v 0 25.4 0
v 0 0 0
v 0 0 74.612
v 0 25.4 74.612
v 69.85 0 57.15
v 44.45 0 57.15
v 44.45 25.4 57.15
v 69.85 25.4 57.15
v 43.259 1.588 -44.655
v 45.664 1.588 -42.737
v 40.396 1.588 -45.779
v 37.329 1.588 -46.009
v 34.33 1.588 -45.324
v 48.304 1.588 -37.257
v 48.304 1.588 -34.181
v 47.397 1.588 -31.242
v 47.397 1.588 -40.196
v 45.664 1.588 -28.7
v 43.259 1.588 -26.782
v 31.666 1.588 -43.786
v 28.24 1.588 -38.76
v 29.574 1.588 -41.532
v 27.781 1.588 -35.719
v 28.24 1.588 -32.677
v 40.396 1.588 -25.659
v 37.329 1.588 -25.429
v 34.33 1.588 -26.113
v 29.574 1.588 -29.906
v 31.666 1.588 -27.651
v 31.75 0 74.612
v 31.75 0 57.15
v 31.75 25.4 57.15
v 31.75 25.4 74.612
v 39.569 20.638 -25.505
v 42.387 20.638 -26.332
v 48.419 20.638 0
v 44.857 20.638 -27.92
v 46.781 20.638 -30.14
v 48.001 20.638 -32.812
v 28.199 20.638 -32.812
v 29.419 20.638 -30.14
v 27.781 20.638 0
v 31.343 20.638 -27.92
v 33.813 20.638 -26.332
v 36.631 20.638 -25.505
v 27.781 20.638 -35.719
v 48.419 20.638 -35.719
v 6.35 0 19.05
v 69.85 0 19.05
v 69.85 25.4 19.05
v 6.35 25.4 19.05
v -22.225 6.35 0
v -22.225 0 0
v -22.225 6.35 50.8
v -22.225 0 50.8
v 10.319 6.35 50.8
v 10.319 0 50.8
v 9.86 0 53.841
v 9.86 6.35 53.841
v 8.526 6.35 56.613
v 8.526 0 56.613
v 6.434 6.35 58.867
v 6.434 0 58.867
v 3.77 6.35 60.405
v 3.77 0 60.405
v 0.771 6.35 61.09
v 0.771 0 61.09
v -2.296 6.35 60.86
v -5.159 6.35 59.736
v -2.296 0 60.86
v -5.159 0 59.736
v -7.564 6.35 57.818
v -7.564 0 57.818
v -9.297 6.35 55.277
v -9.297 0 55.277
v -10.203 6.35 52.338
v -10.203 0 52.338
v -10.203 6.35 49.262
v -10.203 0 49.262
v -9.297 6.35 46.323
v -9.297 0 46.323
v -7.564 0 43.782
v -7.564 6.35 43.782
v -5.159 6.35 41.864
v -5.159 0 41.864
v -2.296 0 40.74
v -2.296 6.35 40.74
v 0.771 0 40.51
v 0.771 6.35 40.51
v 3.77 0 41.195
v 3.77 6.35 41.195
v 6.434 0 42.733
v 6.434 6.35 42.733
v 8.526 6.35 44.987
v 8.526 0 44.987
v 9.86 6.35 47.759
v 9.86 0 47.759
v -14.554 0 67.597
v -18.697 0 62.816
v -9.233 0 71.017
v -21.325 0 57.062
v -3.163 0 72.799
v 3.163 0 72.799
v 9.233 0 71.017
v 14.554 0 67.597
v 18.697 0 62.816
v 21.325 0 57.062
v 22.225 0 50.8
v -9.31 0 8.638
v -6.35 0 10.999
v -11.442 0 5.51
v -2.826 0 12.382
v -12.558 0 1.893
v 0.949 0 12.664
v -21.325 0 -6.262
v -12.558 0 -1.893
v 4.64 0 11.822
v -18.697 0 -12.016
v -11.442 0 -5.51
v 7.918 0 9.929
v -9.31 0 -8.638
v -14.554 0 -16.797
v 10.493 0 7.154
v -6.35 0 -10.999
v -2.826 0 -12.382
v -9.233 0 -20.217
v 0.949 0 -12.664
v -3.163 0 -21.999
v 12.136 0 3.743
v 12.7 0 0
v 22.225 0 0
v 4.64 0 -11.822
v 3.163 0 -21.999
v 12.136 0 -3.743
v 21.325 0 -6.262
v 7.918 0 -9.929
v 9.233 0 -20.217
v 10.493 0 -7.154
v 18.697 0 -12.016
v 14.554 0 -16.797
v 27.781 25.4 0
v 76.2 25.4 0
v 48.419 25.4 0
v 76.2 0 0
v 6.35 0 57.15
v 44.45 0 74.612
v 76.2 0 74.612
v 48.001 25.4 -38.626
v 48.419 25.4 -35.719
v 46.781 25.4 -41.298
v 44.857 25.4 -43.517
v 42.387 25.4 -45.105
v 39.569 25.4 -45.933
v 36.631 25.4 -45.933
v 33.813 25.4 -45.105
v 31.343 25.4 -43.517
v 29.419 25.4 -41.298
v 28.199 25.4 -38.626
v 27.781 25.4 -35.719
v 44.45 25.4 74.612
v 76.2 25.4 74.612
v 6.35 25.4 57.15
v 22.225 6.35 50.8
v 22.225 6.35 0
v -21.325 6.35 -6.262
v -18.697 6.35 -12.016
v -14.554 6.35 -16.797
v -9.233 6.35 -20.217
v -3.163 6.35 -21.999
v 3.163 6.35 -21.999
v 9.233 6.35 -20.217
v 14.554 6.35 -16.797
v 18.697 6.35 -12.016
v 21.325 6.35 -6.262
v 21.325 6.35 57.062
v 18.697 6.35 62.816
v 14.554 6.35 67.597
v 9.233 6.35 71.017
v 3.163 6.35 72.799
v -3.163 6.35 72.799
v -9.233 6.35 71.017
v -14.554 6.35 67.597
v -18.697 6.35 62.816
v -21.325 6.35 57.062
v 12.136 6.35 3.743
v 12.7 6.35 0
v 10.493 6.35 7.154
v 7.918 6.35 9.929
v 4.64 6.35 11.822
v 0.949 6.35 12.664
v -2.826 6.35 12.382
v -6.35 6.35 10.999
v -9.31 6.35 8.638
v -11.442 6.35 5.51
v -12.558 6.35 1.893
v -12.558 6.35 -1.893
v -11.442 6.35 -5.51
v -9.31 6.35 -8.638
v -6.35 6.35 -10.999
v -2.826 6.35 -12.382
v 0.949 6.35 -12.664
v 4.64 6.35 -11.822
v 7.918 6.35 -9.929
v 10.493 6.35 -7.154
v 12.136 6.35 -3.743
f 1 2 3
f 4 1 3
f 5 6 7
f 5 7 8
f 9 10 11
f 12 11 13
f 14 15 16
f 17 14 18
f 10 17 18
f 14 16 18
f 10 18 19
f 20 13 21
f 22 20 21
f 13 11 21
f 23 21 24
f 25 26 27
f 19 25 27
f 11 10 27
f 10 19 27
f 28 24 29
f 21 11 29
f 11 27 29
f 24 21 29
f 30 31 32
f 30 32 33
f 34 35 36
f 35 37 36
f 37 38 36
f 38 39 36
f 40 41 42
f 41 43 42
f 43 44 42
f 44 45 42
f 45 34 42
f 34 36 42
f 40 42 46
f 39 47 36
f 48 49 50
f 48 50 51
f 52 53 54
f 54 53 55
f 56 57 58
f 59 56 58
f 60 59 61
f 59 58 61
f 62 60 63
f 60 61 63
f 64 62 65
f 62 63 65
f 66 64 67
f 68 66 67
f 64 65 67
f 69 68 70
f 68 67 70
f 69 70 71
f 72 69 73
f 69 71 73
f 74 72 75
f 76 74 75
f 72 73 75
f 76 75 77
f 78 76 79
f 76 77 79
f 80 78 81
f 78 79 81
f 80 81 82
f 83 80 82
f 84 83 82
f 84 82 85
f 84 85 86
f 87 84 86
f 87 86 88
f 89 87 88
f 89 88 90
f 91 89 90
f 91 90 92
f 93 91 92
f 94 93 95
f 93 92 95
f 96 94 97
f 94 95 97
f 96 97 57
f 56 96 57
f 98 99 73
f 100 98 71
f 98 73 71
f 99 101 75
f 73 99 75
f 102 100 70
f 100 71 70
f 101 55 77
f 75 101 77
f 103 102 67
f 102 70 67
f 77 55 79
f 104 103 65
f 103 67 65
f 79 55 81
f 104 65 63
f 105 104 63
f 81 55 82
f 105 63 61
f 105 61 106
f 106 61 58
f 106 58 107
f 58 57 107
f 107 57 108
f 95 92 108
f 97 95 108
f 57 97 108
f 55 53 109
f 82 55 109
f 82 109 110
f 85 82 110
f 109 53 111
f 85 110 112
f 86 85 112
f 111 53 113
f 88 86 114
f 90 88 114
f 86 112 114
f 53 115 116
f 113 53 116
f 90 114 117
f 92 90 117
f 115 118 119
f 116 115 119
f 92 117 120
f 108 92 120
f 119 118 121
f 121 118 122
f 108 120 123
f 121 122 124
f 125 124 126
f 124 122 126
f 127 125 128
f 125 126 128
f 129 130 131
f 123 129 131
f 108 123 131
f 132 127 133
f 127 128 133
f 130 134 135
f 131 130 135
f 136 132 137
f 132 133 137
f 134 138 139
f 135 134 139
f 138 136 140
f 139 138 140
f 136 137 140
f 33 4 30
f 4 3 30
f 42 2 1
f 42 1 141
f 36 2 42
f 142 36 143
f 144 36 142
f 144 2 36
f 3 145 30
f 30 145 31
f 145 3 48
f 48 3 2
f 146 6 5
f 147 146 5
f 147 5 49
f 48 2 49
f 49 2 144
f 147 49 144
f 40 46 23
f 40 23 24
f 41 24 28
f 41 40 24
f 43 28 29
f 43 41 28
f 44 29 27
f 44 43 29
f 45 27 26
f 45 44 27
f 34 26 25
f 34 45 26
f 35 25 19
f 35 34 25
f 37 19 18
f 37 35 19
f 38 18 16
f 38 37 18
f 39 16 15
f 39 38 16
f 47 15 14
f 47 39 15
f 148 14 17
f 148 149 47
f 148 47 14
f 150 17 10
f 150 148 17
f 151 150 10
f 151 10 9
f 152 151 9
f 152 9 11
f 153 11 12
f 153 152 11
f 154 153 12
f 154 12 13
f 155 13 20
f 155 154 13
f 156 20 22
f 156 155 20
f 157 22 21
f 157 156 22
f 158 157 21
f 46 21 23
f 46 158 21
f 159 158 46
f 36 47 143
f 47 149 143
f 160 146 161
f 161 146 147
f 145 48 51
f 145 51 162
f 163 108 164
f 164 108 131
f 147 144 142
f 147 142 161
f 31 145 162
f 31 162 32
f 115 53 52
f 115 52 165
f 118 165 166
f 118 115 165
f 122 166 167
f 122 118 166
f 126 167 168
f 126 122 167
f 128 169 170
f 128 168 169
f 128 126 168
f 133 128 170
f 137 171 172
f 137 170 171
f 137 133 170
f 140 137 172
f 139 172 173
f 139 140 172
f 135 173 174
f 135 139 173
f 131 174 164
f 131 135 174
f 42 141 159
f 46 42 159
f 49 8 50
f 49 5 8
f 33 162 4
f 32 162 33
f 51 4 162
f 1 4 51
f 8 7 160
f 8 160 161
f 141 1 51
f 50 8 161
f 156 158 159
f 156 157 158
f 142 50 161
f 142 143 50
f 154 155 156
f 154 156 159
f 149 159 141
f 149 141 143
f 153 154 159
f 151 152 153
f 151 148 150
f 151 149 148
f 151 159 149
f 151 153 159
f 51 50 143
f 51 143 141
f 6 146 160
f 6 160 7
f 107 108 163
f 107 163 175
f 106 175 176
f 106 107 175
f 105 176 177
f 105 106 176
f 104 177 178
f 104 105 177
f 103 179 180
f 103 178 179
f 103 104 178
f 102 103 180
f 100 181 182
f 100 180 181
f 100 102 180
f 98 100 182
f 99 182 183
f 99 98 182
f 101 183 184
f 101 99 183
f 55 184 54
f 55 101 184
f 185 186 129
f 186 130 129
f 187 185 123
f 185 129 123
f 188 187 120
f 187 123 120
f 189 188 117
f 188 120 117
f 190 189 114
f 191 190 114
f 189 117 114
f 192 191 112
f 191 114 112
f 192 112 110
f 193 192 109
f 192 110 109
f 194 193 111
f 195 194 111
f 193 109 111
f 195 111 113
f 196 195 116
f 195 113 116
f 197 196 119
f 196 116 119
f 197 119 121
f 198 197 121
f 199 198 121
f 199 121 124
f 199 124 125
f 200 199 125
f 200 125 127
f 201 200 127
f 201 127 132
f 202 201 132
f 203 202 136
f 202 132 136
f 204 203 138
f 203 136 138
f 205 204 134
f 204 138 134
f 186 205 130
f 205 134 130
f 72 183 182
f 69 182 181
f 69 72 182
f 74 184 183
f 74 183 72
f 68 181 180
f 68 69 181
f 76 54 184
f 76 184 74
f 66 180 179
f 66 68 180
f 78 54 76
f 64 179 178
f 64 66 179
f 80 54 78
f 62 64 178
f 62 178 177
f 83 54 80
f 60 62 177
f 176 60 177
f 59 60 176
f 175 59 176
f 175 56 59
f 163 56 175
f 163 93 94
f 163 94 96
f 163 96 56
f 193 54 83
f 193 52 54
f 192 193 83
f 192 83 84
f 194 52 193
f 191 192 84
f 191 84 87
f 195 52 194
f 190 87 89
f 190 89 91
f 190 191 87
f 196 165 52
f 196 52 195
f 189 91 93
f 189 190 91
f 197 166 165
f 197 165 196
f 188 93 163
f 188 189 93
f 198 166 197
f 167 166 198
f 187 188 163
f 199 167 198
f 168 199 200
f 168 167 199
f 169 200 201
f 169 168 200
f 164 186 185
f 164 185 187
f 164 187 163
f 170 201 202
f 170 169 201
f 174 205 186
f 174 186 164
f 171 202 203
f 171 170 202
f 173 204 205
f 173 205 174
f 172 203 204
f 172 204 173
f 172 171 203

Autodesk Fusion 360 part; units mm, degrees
sketch "Sketch1" plane through (0, 0, 0) normal (0, 1, 0) x (1, 0, 0)
  line L0 (0, 0) -> (76.2, 0)
  line L1 (76.2, 0) -> (76.2, -74.6125)
  line L2 (0, 0) -> (0, -74.6125)
  line L3 (0, -74.6125) -> (76.2, -74.6125)
  dimension "d17" = 76.2
  dimension "d18" = 74.6125
  dimension "d19" = 74.6125
  dimension "d20" = 76.2
extrude "Extrude1" add sketch "Sketch1" along normal blind 25.4 makes body 1
sketch "Sketch2" plane through (0, 0, 0) normal (0, -1, 0) x (1, 0, 0)
  line L0 (0, 74.6125) -> (0, 0)
  line L1 (0, 0) -> (76.2, 0)
  line L2 (76.2, 0) -> (76.2, 74.6125)
  line L3 (76.2, 74.6125) -> (0, 74.6125)
  line L4 (6.35, 57.15) -> (69.85, 57.15)
  line L5 (69.85, 57.15) -> (69.85, 19.05)
  line L6 (69.85, 19.05) -> (6.35, 19.05)
  line L7 (6.35, 19.05) -> (6.35, 57.15)
  dimension "d23" = 19.05
  dimension "d24" = 63.5
  dimension "d25" = 6.35
  dimension "d26" = 38.1
extrude "Extrude2" cut sketch "Sketch2" against normal through all contours L4 L5 L6 L7 bodies 1
sketch "Sketch3" plane through (0, 0, 0) normal (0, -1, 0) x (1, 0, 0)
  line L0 (6.35, 19.05) -> (6.35, 57.15)
  line L1 (6.35, 57.15) -> (69.85, 57.15)
  line L2 (69.85, 57.15) -> (69.85, 19.05)
  line L3 (69.85, 19.05) -> (6.35, 19.05)
  line L4 (0, 74.6125) -> (0, 0)
  line L5 (0, 0) -> (76.2, 0)
  line L6 (76.2, 0) -> (76.2, 74.6125)
  line L7 (76.2, 74.6125) -> (0, 74.6125)
  line L8 (31.75, 74.6125) -> (44.45, 74.6125)
  line L9 (44.45, 74.6125) -> (44.45, 57.15)
  line L10 (44.45, 57.15) -> (31.75, 57.15)
  line L11 (31.75, 57.15) -> (31.75, 74.6125)
  dimension "d28" = 12.7
  dimension "d29" = 31.75
extrude "Extrude3" cut sketch "Sketch3" against normal through all contours L1 L7 L8 L9 L10 L11 bodies 1
sketch "Sketch4" plane through (0, 25.4, 0) normal (0, 1, 0) x (-1, 0, 0)
  line L0 (-31.75, 74.6125) -> (-31.75, 57.15)
  line L1 (-31.75, 57.15) -> (-6.35, 57.15)
  line L2 (-6.35, 57.15) -> (-6.35, 19.05)
  line L3 (-6.35, 19.05) -> (-69.85, 19.05)
  line L4 (-69.85, 19.05) -> (-69.85, 57.15)
  line L5 (-69.85, 57.15) -> (-44.45, 57.15)
  line L6 (-44.45, 57.15) -> (-44.45, 74.6125)
  line L7 (-44.45, 74.6125) -> (-76.2, 74.6125)
  line L8 (-76.2, 74.6125) -> (-76.2, 0)
  line L9 (-76.2, 0) -> (0, 0)
  line L10 (0, 0) -> (0, 74.6125)
  line L11 (0, 74.6125) -> (-31.75, 74.6125)
  line L12 (-48.4188, 0) -> (-27.7812, 0)
  line L13 (-27.7812, 0) -> (-27.7812, -35.7188)
  line L14 (-27.7812, -35.7188) -> (-48.4188, -35.7188)
  line L15 (-48.4188, -35.7188) -> (-48.4188, 0)
  dimension "d36" = 20.6375
  dimension "d37" = 27.7812
  dimension "d40" = 35.7188
extrude "Extrude4" add sketch "Sketch4" against normal blind 4.7625 contours L9 L12 L13 L14 L15 bodies 1
sketch "Sketch5" plane through (0, 25.4, 0) normal (0, 1, 0) x (-1, 0, 0)
  line L0 (-31.75, 74.6125) -> (-31.75, 57.15)
  line L1 (-31.75, 57.15) -> (-6.35, 57.15)
  line L2 (-6.35, 57.15) -> (-6.35, 19.05)
  line L3 (-6.35, 19.05) -> (-69.85, 19.05)
  line L4 (-69.85, 19.05) -> (-69.85, 57.15)
  line L5 (-69.85, 57.15) -> (-44.45, 57.15)
  line L6 (-44.45, 57.15) -> (-44.45, 74.6125)
  line L7 (-44.45, 74.6125) -> (-76.2, 74.6125)
  line L8 (-76.2, 74.6125) -> (-76.2, 0)
  line L9 (-76.2, 0) -> (-48.4187, 0)
  line L10 (-48.4188, 0) -> (-48.4188, -35.7188)
  line L11 (-48.4188, -35.7188) -> (-27.7812, -35.7188)
  line L12 (-27.7812, -35.7188) -> (-27.7812, 0)
  line L13 (-27.7812, 0) -> (0, 0)
  line L14 (0, 0) -> (0, 74.6125)
  line L15 (0, 74.6125) -> (-31.75, 74.6125)
  line L16 (-27.7812, -35.7188) -> (-48.4188, -35.7188)
  circle A0 centre (-38.1, -35.7188) radius 10.3188
  dimension "d43" = 20.6375
extrude "Extrude5" add sketch "Sketch5" against normal blind 23.8125 contours L11 L16 A0 | L11 L16 A0 bodies 1
sketch "Sketch1 (2)" plane through (0, 0, 0) normal (0, 1, 0) x (1, 0, 0) in component "Link"
  line L0 (-22.225, 0) -> (-22.225, -50.8)
  arc A0 (-22.225, -50.8) -> (22.225, -50.8) centre (0, -50.8) ccw
  line L1 (22.225, -50.8) -> (22.225, 0)
  arc A1 (22.225, 0) -> (-22.225, 0) centre (0, 0) ccw
  line L2 (0, 0) -> (0, -50.8) construction
  dimension "d54" = 50.8
  dimension "d55" = 44.45
extrude "Extrude1'" add sketch "Sketch1 (2)" along normal blind 6.35 separate body makes body 2 in component "Link"
sketch "Sketch2 (2)" plane through (0, 0, 0) normal (0, -1, 0) x (1, 0, 0) in component "Link"
  arc A0 (-22.225, 0) -> (22.225, 0) centre (0, 0) ccw
  line L0 (22.225, 0) -> (22.225, 50.8)
  arc A1 (22.225, 50.8) -> (-22.225, 50.8) centre (0, 50.8) ccw
  line L1 (-22.225, 50.8) -> (-22.225, 0)
  circle A2 centre (0, 50.8) radius 10.3187
  circle A3 centre (0, 0) radius 12.7
  dimension "d58" = 20.6375
  dimension "d59" = 25.4
extrude "Extrude2'" cut sketch "Sketch2 (2)" against normal blind 6.35 contours A2 | A3 bodies 2 in component "Link"
component "Link" placed x (1, 0, 0) y (0, 1, 0) z (0, 0, 1) at (0, 0, 0)
equation "slot_width = 0.500 in"
equation "side_recess = 1.000 in"
equation "slot_height = 1.500 in"
equation "wall_thickness = 0.250 in"
equation "bottom_thickness = ceil(c_min_thickness / size_increment) * size_increment"
equation "lip_thickness = 0.6875 in"
equation "bracket_depth = 1.000 in"
equation "opening_width = slot_width + 2 * side_recess"
equation "bracket_width = opening_width + 2 * wall_thickness"
equation "bracket_height = bottom_thickness + slot_height + lip_thickness"
equation "c_span = opening_width + wall_thickness"
equation "size_increment = 0.0625 in"
equation "d17 = bracket_width"
equation "d18 = bracket_height"
equation "d19 = bracket_height"
equation "d20 = bracket_width"
equation "d21 = bracket_depth"
equation "d23 = bottom_thickness"
equation "d24 = opening_width"
equation "d25 = wall_thickness"
equation "d26 = slot_height"
equation "d28 = slot_width"
equation "d29 = ( bracket_width - slot_width ) / 2"
equation "a_diameter = 0.8125 in"
equation "b_width = 0.8125 in"
equation "b_thickness = 0.1875 in"
equation "b_clear_length = 1.000 in"
equation "b_total_length = b_clear_length + a_diameter / 2"
equation "d36 = b_width"
equation "d37 = ( bracket_width - b_width ) / 2"
equation "d40 = b_total_length"
equation "a_exposed_length = 0.750 in"
equation "a_total_length = a_exposed_length + b_thickness"
equation "d43 = a_diameter"
equation "link_width = 1.750 in"
equation "link_thickness = 0.250 in"
equation "link_spacing = 2.000 in"
equation "link_end_radius = link_width / 2"
equation "link_length = link_spacing + 2 * link_end_radius"
equation "link_a_hole = a_diameter"
equation "shaft_basic_diameter = 1.000 in"
equation "link_shaft_hole = shaft_basic_diameter"
equation "d54 = link_spacing"
equation "d55 = link_width"
equation "d56 = link_thickness"
equation "d58 = link_a_hole"
equation "d59 = link_shaft_hole"
